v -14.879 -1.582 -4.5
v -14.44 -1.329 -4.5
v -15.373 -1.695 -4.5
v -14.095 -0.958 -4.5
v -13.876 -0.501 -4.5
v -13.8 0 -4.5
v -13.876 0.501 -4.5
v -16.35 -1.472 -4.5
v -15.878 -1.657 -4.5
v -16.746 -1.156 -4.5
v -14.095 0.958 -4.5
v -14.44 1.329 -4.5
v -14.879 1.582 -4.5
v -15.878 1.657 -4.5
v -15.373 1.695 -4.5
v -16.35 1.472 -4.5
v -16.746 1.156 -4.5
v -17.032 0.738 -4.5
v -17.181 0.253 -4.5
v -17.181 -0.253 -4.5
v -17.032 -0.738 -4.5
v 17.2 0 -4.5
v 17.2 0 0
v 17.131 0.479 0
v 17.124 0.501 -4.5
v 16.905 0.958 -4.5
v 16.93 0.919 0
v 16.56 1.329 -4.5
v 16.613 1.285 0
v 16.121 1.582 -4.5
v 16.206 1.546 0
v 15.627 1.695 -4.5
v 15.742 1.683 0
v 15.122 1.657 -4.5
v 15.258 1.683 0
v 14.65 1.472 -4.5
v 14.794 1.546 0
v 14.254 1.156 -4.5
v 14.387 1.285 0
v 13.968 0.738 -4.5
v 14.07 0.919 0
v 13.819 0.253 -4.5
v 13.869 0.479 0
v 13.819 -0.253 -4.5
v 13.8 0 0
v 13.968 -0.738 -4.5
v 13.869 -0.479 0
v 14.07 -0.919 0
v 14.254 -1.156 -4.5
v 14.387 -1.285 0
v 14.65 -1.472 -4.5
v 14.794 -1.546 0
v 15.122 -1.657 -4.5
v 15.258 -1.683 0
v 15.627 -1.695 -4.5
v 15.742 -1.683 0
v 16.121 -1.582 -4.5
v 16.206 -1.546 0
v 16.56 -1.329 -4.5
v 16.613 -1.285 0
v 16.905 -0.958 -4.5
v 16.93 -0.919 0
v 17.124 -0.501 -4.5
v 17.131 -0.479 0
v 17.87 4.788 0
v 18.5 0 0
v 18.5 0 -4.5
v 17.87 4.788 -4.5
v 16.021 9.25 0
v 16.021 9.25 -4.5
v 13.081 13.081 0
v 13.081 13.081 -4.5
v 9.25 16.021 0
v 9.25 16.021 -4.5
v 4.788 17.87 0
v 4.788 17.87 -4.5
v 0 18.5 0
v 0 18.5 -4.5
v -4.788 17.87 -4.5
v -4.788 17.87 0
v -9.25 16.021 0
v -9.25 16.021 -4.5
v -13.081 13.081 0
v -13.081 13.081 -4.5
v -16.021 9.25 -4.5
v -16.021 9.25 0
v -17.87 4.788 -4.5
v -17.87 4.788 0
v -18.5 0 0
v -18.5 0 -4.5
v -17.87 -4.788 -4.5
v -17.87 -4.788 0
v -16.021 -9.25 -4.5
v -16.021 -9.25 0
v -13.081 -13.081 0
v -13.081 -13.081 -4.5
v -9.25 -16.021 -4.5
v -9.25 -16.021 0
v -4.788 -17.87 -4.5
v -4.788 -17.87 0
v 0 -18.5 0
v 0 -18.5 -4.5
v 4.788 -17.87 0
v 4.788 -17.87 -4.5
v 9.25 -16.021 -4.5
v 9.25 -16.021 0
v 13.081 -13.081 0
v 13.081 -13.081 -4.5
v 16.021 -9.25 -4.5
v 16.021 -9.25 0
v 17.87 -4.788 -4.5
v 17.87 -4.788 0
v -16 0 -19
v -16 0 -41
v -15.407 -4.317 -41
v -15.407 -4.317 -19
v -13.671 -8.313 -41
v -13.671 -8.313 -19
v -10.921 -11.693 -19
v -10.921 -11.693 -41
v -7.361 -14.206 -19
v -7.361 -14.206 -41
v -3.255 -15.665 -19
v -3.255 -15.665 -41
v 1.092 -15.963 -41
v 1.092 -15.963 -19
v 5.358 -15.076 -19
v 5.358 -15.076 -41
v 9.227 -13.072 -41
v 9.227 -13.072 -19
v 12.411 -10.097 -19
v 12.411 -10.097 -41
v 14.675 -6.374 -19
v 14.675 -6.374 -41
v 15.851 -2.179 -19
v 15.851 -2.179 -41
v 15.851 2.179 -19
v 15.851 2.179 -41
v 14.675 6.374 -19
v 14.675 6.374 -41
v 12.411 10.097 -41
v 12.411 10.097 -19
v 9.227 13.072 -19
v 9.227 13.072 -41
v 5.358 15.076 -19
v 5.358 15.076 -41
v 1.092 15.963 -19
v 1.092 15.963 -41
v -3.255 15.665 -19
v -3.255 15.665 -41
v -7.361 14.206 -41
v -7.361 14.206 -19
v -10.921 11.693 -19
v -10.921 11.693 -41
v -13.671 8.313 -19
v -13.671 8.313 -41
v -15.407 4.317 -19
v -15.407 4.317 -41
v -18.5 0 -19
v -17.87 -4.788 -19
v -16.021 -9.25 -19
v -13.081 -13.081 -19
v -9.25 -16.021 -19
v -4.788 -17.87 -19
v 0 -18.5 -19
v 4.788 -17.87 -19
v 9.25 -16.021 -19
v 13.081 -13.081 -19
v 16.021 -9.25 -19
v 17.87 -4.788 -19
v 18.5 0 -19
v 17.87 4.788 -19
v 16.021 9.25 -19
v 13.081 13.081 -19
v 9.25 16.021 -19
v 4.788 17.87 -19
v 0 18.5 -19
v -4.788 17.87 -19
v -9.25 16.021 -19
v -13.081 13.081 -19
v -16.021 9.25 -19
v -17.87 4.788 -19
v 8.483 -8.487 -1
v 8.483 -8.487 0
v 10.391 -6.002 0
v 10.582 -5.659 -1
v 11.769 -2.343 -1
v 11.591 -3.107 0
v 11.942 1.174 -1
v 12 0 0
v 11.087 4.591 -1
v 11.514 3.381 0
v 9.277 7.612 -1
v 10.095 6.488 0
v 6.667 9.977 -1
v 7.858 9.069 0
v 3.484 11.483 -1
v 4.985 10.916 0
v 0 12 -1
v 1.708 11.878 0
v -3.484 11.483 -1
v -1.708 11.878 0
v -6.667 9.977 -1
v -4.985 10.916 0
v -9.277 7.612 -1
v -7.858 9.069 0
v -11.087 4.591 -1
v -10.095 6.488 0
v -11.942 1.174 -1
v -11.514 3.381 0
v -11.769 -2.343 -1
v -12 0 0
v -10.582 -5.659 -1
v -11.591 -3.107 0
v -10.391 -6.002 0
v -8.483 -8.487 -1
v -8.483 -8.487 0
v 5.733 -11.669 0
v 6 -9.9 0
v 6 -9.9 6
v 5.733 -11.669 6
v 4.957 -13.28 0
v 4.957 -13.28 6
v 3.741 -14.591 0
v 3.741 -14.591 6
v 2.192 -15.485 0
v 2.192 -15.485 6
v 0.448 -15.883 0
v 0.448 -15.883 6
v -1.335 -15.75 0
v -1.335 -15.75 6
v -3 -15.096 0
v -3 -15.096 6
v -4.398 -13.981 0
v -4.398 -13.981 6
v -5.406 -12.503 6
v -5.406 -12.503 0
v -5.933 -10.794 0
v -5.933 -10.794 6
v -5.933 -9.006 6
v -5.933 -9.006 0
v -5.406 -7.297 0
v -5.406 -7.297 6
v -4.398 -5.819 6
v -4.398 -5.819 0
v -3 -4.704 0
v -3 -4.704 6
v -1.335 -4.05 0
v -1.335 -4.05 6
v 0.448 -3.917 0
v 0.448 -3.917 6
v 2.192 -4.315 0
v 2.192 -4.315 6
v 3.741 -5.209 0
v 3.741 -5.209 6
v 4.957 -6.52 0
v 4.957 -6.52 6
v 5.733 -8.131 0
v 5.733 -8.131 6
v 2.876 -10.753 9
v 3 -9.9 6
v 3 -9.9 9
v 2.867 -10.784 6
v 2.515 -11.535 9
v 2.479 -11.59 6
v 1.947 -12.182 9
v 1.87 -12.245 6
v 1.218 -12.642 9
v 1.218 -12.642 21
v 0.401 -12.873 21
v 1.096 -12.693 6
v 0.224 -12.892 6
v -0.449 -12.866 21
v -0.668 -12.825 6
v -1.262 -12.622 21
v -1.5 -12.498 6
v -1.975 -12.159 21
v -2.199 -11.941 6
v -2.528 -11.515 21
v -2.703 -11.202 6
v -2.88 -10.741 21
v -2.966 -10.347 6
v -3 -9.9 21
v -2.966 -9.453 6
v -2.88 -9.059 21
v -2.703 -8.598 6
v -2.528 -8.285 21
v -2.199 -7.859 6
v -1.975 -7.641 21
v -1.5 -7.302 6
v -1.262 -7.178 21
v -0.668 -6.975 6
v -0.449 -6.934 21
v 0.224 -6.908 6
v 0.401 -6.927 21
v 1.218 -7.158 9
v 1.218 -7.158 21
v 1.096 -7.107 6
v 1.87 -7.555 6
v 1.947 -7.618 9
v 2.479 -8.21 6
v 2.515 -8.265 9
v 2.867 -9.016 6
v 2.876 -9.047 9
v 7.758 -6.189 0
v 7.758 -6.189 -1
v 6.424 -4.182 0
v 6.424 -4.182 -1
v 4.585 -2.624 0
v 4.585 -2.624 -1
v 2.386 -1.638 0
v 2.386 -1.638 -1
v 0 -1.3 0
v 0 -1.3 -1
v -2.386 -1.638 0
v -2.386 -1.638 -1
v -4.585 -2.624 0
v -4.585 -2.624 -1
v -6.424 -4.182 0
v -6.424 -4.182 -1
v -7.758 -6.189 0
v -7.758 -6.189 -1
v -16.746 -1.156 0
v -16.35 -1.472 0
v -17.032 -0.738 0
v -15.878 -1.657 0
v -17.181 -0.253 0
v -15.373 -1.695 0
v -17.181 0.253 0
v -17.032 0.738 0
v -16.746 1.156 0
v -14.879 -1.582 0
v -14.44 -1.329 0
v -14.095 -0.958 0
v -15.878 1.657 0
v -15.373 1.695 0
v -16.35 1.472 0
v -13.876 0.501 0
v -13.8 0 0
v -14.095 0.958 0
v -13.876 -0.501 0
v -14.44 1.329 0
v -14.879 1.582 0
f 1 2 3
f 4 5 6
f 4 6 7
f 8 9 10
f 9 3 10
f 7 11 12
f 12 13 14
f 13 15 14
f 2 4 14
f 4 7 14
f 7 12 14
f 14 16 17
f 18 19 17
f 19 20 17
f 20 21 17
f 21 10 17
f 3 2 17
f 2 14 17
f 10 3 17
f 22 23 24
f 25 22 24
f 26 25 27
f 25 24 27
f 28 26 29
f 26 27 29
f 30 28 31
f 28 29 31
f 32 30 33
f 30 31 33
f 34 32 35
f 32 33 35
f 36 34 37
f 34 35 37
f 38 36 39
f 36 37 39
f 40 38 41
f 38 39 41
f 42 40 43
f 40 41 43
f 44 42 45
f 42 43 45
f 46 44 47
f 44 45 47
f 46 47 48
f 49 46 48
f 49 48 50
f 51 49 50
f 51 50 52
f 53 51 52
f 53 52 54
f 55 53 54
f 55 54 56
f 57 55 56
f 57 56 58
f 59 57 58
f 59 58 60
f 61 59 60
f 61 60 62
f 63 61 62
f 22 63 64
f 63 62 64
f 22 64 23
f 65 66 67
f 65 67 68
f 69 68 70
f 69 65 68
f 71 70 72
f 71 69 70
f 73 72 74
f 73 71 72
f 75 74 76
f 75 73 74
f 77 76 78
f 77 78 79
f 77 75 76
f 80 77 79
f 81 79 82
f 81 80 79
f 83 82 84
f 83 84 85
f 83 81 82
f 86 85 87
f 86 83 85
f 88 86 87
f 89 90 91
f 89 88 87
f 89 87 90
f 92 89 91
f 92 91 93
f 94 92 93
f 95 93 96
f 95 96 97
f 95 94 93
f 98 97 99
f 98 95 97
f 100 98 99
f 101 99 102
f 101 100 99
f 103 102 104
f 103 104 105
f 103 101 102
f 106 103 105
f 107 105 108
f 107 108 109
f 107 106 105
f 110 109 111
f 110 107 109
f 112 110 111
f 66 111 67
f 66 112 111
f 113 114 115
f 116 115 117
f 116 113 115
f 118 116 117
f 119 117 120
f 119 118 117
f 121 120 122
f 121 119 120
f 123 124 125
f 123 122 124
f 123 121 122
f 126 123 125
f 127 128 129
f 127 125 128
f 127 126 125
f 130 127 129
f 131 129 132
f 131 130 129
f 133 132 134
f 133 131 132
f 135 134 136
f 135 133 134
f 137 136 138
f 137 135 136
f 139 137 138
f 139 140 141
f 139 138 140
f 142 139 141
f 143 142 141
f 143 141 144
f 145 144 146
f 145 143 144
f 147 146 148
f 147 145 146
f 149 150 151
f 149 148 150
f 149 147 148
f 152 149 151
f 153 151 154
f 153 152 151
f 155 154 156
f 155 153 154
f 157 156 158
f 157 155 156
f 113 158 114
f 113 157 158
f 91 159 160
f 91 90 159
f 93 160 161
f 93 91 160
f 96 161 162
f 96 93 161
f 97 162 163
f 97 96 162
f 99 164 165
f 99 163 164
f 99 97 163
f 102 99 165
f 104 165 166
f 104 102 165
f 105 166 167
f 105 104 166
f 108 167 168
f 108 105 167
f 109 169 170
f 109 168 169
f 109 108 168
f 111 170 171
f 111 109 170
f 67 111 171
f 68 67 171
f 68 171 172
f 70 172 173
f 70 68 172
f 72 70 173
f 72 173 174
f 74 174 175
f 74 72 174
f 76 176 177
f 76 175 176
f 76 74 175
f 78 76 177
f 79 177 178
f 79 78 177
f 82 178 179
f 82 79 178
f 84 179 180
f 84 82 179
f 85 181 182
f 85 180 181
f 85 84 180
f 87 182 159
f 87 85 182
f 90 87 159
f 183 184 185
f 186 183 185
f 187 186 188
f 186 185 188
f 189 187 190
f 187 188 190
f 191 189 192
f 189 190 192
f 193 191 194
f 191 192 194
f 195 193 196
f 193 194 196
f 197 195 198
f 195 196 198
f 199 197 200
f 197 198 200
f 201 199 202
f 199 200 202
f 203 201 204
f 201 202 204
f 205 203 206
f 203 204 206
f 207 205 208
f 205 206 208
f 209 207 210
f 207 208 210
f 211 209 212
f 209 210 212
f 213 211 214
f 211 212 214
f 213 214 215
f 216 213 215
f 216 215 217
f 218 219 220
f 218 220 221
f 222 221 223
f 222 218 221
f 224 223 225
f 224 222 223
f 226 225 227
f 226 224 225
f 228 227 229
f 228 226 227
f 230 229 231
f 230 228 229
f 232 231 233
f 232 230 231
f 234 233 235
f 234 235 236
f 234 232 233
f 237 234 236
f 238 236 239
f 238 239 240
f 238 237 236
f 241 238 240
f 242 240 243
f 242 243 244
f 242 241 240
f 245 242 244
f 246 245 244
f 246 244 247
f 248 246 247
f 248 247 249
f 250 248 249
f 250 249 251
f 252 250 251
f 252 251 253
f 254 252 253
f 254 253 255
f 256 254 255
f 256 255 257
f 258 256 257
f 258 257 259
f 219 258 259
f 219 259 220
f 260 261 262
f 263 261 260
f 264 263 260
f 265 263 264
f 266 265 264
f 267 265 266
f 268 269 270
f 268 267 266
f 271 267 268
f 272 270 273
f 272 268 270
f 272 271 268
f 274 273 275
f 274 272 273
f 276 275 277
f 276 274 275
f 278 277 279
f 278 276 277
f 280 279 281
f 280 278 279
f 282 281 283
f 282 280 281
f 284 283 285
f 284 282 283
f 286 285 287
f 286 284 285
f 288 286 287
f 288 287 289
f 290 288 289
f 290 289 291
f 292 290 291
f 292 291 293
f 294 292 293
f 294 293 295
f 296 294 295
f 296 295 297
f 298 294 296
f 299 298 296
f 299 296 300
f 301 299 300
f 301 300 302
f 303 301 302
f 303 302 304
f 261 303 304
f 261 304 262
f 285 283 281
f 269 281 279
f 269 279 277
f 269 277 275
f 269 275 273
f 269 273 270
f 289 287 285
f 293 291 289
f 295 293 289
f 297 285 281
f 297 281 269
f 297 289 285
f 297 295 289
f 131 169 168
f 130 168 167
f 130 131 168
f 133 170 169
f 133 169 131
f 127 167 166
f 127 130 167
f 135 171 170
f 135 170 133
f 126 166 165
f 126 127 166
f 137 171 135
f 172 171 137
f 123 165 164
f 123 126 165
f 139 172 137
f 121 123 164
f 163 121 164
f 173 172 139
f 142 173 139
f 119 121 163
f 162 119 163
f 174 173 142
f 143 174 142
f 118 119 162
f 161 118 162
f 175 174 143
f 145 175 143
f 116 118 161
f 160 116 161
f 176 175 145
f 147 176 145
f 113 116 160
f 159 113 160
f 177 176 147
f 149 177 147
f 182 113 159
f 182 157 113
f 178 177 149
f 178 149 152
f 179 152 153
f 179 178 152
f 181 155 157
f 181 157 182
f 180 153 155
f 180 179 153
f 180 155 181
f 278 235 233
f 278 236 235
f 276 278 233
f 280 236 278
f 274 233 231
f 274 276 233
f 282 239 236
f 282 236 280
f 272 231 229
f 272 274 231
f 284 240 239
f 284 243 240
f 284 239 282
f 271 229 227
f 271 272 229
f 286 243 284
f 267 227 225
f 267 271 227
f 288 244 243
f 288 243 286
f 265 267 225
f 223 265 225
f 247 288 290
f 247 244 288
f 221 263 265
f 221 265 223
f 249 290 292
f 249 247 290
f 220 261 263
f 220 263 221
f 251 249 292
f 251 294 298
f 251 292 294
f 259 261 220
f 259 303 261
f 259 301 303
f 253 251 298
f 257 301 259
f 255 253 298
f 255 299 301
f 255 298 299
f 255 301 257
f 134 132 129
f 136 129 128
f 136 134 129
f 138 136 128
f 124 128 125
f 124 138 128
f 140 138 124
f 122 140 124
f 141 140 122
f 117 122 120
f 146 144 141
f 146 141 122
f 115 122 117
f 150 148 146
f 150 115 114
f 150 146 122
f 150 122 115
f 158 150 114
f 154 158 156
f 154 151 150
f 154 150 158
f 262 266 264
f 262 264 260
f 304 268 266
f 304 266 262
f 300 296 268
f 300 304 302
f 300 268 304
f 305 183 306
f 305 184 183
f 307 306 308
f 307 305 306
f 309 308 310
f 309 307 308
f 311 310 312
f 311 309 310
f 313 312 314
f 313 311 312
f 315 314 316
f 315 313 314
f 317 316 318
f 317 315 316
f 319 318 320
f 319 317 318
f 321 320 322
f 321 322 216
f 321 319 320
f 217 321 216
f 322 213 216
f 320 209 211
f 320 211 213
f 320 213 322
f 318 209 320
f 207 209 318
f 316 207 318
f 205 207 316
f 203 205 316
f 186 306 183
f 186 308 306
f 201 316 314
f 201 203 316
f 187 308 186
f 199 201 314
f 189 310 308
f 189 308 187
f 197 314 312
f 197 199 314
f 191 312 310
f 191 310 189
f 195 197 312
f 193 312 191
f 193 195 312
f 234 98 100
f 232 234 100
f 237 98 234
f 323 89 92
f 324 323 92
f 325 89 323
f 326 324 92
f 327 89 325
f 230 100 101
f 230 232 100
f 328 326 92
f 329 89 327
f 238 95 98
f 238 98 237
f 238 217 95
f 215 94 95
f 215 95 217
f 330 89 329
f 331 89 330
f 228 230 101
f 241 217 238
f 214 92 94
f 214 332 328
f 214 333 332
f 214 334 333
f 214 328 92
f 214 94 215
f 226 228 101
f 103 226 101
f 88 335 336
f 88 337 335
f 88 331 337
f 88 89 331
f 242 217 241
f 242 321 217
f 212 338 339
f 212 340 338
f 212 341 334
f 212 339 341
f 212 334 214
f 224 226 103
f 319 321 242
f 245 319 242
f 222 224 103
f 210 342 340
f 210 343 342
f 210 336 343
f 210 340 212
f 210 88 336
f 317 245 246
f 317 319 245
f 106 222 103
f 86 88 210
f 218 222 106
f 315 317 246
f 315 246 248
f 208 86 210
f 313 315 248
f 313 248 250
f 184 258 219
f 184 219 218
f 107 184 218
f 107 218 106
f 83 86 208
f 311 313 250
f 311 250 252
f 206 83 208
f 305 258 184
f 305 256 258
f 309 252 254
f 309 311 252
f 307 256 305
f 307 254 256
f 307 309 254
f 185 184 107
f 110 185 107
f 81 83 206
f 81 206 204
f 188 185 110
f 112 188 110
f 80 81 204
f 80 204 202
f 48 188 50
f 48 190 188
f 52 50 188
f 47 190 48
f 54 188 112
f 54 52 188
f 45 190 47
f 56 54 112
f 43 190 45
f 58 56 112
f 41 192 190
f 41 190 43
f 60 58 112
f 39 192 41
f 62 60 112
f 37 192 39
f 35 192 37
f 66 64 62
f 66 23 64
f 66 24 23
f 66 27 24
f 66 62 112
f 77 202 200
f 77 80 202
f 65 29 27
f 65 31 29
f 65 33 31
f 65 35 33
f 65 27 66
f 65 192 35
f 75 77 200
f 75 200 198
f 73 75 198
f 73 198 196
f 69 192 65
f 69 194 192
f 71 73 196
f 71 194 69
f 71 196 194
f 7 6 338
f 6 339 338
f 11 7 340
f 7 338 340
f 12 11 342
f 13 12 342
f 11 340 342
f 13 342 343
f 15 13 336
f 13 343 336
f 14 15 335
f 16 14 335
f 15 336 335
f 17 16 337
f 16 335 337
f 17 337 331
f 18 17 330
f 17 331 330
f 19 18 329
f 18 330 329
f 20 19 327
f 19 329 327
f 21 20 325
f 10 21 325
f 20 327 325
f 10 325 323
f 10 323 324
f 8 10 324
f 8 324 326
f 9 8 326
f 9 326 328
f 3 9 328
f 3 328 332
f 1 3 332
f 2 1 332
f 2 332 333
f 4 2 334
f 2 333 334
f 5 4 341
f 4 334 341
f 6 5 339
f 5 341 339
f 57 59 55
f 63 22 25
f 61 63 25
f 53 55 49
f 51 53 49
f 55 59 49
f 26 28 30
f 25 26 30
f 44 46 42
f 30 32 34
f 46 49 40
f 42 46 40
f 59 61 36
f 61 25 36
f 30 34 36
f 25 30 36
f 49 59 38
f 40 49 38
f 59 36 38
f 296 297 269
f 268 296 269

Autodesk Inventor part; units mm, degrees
ref_plane "YZ Plane" through (0, 0, 0) normal (1, 0, 0) x (0, 1, 0)
ref_plane "XZ Plane" through (0, 0, 0) normal (0, 1, 0) x (-1, 0, 0)
ref_plane "XY Plane" through (0, 0, 0) normal (0, 0, 1) x (1, 0, 0)
sketch "Sketch1" plane through (0, 0, 0) normal (0, 0, 1) x (1, 0, 0)
  circle A0 centre (0, 0) radius 18.5
  line L0 (-15.5, 0) -> (15.5, 0)
  circle A1 centre (-15.5, 0) radius 1.7
  circle A2 centre (15.5, 0) radius 1.7
  dimension "d0" = 37
  dimension "d1" = 31
  dimension "d2" = 3.4
  dimension "d3" = 3.4
extrude "Extrusion1" add sketch "Sketch1" against normal blind 4.5
sketch "Sketch2" plane through (0, 0, 0) normal (0, 0, 1) x (1, 0, 0)
  arc A0 (8.4832, -8.4874) -> (-8.4832, -8.4874) centre (0, -9.9) ccw
  circle A1 centre (0, 0) radius 18.5 projected
  circle A2 centre (0, -9.9) radius 6
  arc A3 (8.4832, -8.4874) -> (-8.4832, -8.4874) centre (0, 0) ccw
  arc A4 (-5.9787, -10.4045) -> (5.9787, -10.4045) centre (0, 0) ccw
  dimension "d10" = 17.2
  dimension "d11" = 12
extrude "Extrusion2" add sketch "Sketch2" along normal blind 6 contours A2 A4 | A4 A2
extrude "Extrusion3" cut sketch "Sketch2" against normal blind 1 contours A0 A3
sketch "Sketch3" plane through (0, -9.9, 6) normal (0, 0, 1) x (1, 0, 0)
  circle A0 centre (0, 0) radius 6 projected
  circle A1 centre (0, 0) radius 3
  point P0 (0, 9.9)
  dimension "d16" = 6
extrude "Extrusion4" add sketch "Sketch3" along normal blind 15 contours A1
sketch "Sketch4" plane through (0, 0, -4.5) normal (0, 0, -1) x (-1, 0, 0)
  circle A0 centre (0, 0) radius 18.5 projected
extrude "Extrusion5" add sketch "Sketch4" along normal blind 14.5
sketch "Sketch5" plane through (0, -9.9, 21) normal (0, 0, 1) x (1, 0, 0)
  circle A0 centre (0, 0) radius 3 projected
  line L0 (1.2182, 2.7415) -> (1.2182, -2.7415)
  point P0 (0, 9.9)
extrude "Extrusion6" cut sketch "Sketch5" against normal blind 12 contours A0 L0 picked at (1.8121, 0)
sketch "Sketch6" plane through (0, 0, -19) normal (0, 0, -1) x (-1, 0, 0)
  circle A0 centre (0, 0) radius 16
  dimension "d23" = 32
extrude "Extrusion7" add sketch "Sketch6" along normal blind 22
sketch "Sketch7" plane through (0, 0, 0) normal (0, 0, 1) x (1, 0, 0)
  circle A0 centre (-15.5, 0) radius 1.7 projected
  circle A1 centre (15.5, 0) radius 1.7 projected
  circle A2 centre (0, 0) radius 18.5 projected
properties part number "MOTOR DC"
